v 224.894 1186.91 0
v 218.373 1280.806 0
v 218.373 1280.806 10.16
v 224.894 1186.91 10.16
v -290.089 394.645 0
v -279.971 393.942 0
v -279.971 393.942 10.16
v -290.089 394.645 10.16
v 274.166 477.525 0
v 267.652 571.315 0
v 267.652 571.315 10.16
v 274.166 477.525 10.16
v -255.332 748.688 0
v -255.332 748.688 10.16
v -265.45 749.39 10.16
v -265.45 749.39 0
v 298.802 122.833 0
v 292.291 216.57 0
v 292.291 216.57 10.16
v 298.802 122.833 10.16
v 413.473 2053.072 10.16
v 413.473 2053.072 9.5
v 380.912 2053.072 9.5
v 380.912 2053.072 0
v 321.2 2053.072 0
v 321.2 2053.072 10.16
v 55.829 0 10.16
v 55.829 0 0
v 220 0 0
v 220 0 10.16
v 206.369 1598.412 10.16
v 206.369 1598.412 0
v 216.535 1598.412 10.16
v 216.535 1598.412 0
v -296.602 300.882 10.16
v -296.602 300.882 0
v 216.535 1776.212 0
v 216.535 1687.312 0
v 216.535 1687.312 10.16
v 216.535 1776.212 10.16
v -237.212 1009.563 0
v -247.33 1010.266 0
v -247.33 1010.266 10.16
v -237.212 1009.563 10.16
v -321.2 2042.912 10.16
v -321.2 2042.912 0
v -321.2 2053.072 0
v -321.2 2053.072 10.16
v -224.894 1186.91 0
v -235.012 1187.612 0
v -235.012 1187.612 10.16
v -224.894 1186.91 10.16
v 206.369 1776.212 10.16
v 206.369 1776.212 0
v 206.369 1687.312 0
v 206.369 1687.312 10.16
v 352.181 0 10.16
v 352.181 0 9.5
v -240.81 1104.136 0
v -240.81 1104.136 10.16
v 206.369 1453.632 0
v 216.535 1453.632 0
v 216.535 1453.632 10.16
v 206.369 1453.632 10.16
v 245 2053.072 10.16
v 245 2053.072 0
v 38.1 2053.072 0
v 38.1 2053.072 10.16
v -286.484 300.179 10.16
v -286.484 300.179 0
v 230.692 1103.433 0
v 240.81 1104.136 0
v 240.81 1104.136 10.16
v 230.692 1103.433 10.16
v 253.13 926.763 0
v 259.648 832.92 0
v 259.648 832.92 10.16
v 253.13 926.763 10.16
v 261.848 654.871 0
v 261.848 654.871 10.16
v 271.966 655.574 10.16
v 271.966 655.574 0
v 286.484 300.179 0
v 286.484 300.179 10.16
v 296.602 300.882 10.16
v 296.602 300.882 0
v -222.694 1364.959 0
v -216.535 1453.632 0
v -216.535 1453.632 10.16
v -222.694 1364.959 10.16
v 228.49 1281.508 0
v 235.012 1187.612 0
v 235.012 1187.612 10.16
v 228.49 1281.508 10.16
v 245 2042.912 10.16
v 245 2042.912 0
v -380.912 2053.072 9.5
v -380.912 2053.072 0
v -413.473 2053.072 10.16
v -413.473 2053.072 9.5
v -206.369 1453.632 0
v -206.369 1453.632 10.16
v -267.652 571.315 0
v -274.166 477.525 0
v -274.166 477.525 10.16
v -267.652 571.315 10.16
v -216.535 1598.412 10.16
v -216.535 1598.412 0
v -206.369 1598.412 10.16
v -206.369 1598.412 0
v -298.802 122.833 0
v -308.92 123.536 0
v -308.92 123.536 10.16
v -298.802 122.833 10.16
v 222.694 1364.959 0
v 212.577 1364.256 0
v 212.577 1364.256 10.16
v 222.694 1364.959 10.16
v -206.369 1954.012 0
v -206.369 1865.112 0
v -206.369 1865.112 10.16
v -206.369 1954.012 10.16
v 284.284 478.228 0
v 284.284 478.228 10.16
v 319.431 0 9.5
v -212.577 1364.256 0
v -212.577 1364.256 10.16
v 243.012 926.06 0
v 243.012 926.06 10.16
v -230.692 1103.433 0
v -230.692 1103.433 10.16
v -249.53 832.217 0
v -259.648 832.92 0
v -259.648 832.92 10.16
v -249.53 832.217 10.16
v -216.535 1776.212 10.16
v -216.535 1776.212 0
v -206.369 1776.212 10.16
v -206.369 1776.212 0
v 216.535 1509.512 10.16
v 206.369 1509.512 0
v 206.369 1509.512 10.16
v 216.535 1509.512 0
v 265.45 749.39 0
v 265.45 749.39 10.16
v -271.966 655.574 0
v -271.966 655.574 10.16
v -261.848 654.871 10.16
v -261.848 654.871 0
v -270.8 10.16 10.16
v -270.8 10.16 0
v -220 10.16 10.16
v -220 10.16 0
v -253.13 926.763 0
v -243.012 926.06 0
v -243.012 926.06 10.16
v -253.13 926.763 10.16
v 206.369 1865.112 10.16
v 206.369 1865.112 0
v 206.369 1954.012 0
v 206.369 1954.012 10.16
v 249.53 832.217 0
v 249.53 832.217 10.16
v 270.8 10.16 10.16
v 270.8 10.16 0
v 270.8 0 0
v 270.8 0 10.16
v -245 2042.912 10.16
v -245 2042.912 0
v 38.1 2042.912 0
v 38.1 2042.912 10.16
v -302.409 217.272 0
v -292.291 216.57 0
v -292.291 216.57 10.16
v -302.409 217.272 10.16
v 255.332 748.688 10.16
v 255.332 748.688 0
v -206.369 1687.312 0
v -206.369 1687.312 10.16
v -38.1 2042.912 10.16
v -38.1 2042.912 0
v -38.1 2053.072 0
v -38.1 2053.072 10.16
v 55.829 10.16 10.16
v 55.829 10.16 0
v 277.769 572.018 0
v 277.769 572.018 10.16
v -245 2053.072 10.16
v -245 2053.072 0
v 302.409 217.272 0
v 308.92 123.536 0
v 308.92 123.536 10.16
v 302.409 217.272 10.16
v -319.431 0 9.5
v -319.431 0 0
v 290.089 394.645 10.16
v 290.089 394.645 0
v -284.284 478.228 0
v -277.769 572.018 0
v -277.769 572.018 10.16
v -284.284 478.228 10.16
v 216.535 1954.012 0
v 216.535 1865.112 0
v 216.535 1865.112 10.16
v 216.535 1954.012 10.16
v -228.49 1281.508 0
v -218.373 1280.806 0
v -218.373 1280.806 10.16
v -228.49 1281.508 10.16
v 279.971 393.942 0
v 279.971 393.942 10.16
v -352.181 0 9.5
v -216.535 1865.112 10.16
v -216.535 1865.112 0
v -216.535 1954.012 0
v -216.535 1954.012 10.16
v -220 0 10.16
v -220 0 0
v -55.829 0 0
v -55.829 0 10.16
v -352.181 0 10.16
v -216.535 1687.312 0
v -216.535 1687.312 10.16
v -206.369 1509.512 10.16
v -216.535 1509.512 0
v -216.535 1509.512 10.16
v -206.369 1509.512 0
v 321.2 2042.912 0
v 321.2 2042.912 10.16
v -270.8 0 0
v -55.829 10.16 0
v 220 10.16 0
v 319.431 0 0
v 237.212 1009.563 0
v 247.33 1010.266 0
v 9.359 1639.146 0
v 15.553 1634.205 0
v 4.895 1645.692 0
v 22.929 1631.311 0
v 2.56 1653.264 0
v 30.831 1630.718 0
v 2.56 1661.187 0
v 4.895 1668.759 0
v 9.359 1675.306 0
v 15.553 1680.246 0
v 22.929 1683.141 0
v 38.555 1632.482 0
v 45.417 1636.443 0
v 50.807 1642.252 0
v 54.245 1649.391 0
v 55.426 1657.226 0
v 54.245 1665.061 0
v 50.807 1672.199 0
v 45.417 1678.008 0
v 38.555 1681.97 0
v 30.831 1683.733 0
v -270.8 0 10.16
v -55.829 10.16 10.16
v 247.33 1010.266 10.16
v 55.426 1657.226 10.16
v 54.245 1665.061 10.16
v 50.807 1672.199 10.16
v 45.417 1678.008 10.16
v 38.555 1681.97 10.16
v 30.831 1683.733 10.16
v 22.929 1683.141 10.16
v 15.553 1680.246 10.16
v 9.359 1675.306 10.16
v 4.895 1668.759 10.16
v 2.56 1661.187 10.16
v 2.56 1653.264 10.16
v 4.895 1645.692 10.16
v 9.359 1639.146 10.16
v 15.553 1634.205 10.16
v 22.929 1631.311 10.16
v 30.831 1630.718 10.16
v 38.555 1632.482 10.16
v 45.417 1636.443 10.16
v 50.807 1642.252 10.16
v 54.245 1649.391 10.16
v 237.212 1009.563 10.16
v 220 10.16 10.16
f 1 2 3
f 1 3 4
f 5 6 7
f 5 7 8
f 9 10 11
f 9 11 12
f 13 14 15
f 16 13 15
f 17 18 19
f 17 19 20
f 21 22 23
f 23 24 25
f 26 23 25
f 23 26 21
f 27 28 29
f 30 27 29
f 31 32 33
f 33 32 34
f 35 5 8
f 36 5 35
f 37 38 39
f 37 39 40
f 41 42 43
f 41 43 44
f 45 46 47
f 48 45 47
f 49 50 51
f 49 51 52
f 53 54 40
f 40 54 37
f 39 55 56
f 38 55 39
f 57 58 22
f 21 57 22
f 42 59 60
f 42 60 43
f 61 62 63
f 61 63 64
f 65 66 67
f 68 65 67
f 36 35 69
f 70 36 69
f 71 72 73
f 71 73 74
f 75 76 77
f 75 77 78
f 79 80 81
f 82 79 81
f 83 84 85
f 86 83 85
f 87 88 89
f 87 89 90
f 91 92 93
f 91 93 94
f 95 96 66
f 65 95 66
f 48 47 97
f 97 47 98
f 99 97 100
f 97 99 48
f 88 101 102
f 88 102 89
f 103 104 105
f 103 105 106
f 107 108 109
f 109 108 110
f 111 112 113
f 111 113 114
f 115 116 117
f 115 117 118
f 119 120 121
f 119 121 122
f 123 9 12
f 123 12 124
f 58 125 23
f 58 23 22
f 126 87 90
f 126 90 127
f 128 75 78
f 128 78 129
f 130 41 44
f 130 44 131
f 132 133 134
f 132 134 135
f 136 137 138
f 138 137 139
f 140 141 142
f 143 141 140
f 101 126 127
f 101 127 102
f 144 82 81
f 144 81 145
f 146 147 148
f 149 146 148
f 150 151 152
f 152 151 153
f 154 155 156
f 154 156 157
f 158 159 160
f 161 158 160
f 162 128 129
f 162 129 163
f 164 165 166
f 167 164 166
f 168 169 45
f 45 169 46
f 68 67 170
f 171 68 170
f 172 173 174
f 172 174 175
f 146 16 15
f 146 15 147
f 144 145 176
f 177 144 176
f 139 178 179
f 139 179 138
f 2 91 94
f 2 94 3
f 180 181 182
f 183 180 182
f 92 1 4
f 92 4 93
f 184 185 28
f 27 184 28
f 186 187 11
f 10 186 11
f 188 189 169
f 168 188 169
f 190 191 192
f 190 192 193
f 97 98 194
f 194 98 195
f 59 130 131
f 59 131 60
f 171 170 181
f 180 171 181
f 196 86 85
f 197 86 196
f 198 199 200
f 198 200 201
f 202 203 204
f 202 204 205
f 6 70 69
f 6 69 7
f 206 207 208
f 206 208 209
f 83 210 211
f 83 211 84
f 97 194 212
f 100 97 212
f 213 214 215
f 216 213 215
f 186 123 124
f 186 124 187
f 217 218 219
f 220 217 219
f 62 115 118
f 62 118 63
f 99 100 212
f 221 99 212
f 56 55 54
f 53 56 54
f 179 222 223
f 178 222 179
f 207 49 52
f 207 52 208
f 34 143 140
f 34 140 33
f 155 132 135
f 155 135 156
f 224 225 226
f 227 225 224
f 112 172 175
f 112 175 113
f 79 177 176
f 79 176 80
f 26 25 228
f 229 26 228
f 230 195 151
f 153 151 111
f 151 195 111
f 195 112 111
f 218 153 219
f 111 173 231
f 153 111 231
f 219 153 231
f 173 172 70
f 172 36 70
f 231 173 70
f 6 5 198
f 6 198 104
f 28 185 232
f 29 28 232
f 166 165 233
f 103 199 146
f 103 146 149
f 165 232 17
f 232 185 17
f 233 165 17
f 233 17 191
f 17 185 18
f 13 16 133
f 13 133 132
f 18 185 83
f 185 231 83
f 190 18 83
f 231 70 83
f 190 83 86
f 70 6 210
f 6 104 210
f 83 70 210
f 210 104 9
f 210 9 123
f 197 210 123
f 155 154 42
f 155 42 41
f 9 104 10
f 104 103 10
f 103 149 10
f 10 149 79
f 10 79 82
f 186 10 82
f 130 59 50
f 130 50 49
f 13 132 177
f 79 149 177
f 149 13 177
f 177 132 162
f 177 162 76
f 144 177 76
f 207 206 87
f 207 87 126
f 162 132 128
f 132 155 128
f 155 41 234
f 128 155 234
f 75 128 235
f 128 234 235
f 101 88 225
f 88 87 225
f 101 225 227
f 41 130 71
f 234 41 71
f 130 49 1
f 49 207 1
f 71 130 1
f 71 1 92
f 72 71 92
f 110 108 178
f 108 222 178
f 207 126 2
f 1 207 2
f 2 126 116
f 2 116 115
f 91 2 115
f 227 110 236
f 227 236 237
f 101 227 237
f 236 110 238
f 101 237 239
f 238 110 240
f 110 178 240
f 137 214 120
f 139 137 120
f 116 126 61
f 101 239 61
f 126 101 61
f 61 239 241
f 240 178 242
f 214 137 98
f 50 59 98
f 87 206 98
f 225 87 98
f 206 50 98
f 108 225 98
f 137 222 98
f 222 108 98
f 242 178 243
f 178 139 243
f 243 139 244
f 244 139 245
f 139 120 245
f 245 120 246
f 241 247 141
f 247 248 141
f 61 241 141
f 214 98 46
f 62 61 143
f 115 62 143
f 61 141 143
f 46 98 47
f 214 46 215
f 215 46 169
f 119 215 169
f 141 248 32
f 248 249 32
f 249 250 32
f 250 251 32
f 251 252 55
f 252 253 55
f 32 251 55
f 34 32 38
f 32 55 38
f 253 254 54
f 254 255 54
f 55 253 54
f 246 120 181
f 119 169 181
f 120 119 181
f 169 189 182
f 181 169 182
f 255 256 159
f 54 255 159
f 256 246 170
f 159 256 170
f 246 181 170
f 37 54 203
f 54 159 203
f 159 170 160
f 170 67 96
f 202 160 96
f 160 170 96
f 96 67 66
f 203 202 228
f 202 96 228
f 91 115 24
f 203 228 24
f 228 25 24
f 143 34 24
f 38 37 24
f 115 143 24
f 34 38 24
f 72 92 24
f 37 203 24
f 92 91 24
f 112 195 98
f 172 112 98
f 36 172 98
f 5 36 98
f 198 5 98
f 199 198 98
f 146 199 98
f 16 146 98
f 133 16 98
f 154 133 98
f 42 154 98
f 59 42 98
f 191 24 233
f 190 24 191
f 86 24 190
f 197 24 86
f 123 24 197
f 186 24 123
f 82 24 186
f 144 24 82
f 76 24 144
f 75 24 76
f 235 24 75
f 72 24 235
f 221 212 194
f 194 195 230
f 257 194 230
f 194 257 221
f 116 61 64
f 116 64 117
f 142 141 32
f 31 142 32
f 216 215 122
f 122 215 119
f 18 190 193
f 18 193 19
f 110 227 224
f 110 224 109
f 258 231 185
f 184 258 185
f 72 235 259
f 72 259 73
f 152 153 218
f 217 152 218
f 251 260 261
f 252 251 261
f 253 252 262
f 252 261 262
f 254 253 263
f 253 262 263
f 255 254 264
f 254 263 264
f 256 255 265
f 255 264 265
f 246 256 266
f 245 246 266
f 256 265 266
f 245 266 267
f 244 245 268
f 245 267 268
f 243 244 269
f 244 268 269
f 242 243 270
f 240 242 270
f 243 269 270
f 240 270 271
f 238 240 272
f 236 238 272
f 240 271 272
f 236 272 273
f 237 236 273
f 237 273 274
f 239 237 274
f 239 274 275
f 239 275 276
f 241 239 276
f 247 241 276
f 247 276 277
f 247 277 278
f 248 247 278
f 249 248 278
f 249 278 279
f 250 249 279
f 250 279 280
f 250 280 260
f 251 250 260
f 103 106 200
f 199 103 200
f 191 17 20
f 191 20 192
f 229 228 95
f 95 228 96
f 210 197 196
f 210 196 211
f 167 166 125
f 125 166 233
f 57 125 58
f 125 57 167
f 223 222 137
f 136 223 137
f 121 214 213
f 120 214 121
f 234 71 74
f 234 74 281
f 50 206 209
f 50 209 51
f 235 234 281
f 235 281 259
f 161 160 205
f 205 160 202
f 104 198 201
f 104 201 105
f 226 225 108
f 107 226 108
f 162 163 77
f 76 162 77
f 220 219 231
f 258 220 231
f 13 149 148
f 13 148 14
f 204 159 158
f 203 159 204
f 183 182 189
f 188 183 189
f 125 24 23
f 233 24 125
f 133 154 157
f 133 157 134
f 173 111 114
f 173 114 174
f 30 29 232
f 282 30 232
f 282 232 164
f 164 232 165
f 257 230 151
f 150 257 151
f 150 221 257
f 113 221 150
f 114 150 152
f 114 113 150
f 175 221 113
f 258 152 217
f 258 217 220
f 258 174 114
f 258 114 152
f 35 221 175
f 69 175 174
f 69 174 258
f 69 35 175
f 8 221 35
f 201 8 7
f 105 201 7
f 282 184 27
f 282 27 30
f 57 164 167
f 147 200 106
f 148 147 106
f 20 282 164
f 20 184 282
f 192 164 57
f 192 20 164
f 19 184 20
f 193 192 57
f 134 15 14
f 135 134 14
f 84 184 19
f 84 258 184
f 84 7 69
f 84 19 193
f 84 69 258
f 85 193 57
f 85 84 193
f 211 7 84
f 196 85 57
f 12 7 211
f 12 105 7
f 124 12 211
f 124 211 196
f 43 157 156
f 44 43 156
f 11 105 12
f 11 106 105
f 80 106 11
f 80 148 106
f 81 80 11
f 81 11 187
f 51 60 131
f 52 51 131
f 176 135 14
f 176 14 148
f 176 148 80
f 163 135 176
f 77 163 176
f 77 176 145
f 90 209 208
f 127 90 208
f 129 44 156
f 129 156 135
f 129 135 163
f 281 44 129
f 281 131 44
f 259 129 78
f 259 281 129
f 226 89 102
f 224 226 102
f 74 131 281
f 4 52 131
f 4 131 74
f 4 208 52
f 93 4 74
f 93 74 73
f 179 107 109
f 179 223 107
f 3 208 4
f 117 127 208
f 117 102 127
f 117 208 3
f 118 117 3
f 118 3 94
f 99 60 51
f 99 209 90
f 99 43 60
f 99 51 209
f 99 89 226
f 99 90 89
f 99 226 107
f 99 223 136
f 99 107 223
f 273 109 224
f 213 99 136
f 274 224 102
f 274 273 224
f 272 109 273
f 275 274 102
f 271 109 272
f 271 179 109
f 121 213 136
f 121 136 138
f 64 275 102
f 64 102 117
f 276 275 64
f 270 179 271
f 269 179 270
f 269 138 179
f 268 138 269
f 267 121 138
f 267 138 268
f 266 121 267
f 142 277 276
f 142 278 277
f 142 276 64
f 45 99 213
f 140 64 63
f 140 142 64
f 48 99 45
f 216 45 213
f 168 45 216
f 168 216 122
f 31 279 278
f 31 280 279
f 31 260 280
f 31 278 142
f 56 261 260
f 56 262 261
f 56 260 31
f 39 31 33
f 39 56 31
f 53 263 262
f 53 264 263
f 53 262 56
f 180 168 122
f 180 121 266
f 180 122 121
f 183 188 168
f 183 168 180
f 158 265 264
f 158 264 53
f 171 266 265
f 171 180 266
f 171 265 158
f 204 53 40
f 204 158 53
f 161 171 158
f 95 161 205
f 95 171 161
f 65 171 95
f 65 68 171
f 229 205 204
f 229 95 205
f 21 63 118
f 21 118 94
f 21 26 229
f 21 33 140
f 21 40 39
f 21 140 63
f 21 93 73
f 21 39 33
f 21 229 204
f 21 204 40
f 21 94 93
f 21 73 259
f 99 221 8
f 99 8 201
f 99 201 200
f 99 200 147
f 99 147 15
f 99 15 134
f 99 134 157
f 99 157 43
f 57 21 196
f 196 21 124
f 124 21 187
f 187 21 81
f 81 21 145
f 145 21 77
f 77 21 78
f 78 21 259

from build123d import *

# Parameters (mm, degrees)
SKETCH1_W           = 10.166490401
SKETCH1_H           = 88.9
BOSS_EXTRUDE1_DEPTH = 10.16
CUT_LOFT1_DEPTH     = 9.5
SKETCH6_R           = 26.581471798
CUT_EXTRUDE2_DEPTH  = 12


# Read off the part's stored shape, not the designer's step: Cut-Loft1
with BuildPart() as part:
    # Sketch1 → Boss-Extrude1 (new body)
    with BuildSketch(Plane.XY):
        Polygon((-245, 2053.071580455), (-245, 2042.911580455), (-321.2, 2042.911580455), (-321.2, 2053.071580455), (-413.472915973, 2053.071580455), (-352.180527886, 0), (-270.8, 0), (-270.8, 10.16), (-220, 10.16), (-220, 0), (-55.8292, 0), (-55.8292, 10.16), (55.8292, 10.16), (55.8292, 0), (220, 0), (220, 10.16), (270.8, 10.16), (270.8, 0), (352.180527886, 0), (413.472915973, 2053.071580455), (321.2, 2053.071580455), (321.2, 2042.911580455), (245, 2042.911580455), (245, 2053.071580455), (38.1, 2053.071580455), (38.1, 2042.911580455), (-38.1, 2042.911580455), (-38.1, 2053.071580455), align=None)
        with Locations((-211.45202358, 1909.561580455)):
            Rectangle(SKETCH1_W, SKETCH1_H, mode=Mode.SUBTRACT)
        with Locations((-211.45202358, 1731.761580455)):
            Rectangle(SKETCH1_W, SKETCH1_H, mode=Mode.SUBTRACT)
        Polygon((-298.801924037, 122.832814726), (-292.291252627, 216.569681682), (-302.408932711, 217.272424291), (-308.919604121, 123.535557335), align=None, mode=Mode.SUBTRACT)
        Polygon((-286.484012658, 300.178951146), (-279.971498388, 393.942350533), (-290.089178472, 394.645093142), (-296.601692742, 300.881693756), align=None, mode=Mode.SUBTRACT)
        Polygon((-274.16610128, 477.525087567), (-267.651744149, 571.315019385), (-277.769424233, 572.017761994), (-284.283781364, 478.227830176), align=None, mode=Mode.SUBTRACT)
        Polygon((-261.848189901, 654.871223988), (-255.33198991, 748.687688236), (-265.449669994, 749.390430845), (-271.965869985, 655.573966597), align=None, mode=Mode.SUBTRACT)
        Polygon((-249.530278522, 832.217360408), (-243.012235672, 926.060357088), (-253.129915756, 926.763099697), (-259.647958606, 832.920103017), align=None, mode=Mode.SUBTRACT)
        Polygon((-237.212367144, 1009.563496829), (-230.692481433, 1103.433025939), (-240.810161517, 1104.135768548), (-247.330047228, 1010.266239438), align=None, mode=Mode.SUBTRACT)
        Polygon((-224.894455765, 1186.909633249), (-218.372727194, 1280.805694791), (-228.490407278, 1281.5084374), (-235.012135849, 1187.612375858), align=None, mode=Mode.SUBTRACT)
        Polygon((-206.36877838, 1453.631580489), (-216.535268781, 1453.631580489), (-222.69422447, 1364.958512279), (-212.576544386, 1364.25576967), align=None, mode=Mode.SUBTRACT)
        Polygon((216.535268781, 1453.631580489), (206.36877838, 1453.631580489), (212.576544386, 1364.25576967), (222.69422447, 1364.958512279), align=None, mode=Mode.SUBTRACT)
        Polygon((218.372727194, 1280.805694791), (224.894455765, 1186.909633249), (235.012135849, 1187.612375858), (228.490407278, 1281.5084374), align=None, mode=Mode.SUBTRACT)
        Polygon((230.692481433, 1103.433025939), (237.212367144, 1009.563496829), (247.330047228, 1010.266239438), (240.810161517, 1104.135768548), align=None, mode=Mode.SUBTRACT)
        Polygon((243.012235672, 926.060357088), (249.530278522, 832.217360408), (259.647958606, 832.920103017), (253.129915756, 926.763099697), align=None, mode=Mode.SUBTRACT)
        Polygon((255.33198991, 748.687688236), (261.848189901, 654.871223988), (271.965869985, 655.573966597), (265.449669994, 749.390430845), align=None, mode=Mode.SUBTRACT)
        Polygon((267.651744149, 571.315019385), (274.16610128, 477.525087567), (284.283781364, 478.227830176), (277.769424233, 572.017761994), align=None, mode=Mode.SUBTRACT)
        Polygon((279.971498388, 393.942350533), (286.484012658, 300.178951146), (296.601692742, 300.881693756), (290.089178472, 394.645093142), align=None, mode=Mode.SUBTRACT)
        Polygon((292.291252627, 216.569681682), (298.801924037, 122.832814726), (308.919604121, 123.535557335), (302.408932711, 217.272424291), align=None, mode=Mode.SUBTRACT)
        with Locations((211.45202358, 1731.761580455)):
            Rectangle(SKETCH1_W, SKETCH1_H, mode=Mode.SUBTRACT)
        with Locations((-211.45202358, 1553.961580455)):
            Rectangle(SKETCH1_W, SKETCH1_H, mode=Mode.SUBTRACT)
        with Locations((211.45202358, 1553.961580455)):
            Rectangle(SKETCH1_W, SKETCH1_H, mode=Mode.SUBTRACT)
        with Locations((211.45202358, 1909.561580455)):
            Rectangle(SKETCH1_W, SKETCH1_H, mode=Mode.SUBTRACT)
    extrude(amount=BOSS_EXTRUDE1_DEPTH)

    # Cut-Loft1 outline → Cut-Loft1 (cut)
    with BuildSketch(Plane.XY):
        Polygon((413.472915973, 2053.071580455), (380.911770747, 2053.071580455), (319.430777619, 0), (352.180527886, 0), align=None)
    cut_loft1 = extrude(amount=CUT_LOFT1_DEPTH, mode=Mode.SUBTRACT)

    # Mirror1: Cut-Loft1 across plane
    add(cut_loft1.mirror(Plane(origin=(0, 0, 0), x_dir=(0, 0, 1), z_dir=(1, 0, 0))), mode=Mode.SUBTRACT)

    # Sketch6 → Cut-Extrude2 (cut)
    with BuildSketch(Plane.XY.offset(10.16)):
        with Locations((28.844157405, 1657.225539641)):
            Circle(SKETCH6_R)
    extrude(amount=-CUT_EXTRUDE2_DEPTH, mode=Mode.SUBTRACT)


solid = part.part
